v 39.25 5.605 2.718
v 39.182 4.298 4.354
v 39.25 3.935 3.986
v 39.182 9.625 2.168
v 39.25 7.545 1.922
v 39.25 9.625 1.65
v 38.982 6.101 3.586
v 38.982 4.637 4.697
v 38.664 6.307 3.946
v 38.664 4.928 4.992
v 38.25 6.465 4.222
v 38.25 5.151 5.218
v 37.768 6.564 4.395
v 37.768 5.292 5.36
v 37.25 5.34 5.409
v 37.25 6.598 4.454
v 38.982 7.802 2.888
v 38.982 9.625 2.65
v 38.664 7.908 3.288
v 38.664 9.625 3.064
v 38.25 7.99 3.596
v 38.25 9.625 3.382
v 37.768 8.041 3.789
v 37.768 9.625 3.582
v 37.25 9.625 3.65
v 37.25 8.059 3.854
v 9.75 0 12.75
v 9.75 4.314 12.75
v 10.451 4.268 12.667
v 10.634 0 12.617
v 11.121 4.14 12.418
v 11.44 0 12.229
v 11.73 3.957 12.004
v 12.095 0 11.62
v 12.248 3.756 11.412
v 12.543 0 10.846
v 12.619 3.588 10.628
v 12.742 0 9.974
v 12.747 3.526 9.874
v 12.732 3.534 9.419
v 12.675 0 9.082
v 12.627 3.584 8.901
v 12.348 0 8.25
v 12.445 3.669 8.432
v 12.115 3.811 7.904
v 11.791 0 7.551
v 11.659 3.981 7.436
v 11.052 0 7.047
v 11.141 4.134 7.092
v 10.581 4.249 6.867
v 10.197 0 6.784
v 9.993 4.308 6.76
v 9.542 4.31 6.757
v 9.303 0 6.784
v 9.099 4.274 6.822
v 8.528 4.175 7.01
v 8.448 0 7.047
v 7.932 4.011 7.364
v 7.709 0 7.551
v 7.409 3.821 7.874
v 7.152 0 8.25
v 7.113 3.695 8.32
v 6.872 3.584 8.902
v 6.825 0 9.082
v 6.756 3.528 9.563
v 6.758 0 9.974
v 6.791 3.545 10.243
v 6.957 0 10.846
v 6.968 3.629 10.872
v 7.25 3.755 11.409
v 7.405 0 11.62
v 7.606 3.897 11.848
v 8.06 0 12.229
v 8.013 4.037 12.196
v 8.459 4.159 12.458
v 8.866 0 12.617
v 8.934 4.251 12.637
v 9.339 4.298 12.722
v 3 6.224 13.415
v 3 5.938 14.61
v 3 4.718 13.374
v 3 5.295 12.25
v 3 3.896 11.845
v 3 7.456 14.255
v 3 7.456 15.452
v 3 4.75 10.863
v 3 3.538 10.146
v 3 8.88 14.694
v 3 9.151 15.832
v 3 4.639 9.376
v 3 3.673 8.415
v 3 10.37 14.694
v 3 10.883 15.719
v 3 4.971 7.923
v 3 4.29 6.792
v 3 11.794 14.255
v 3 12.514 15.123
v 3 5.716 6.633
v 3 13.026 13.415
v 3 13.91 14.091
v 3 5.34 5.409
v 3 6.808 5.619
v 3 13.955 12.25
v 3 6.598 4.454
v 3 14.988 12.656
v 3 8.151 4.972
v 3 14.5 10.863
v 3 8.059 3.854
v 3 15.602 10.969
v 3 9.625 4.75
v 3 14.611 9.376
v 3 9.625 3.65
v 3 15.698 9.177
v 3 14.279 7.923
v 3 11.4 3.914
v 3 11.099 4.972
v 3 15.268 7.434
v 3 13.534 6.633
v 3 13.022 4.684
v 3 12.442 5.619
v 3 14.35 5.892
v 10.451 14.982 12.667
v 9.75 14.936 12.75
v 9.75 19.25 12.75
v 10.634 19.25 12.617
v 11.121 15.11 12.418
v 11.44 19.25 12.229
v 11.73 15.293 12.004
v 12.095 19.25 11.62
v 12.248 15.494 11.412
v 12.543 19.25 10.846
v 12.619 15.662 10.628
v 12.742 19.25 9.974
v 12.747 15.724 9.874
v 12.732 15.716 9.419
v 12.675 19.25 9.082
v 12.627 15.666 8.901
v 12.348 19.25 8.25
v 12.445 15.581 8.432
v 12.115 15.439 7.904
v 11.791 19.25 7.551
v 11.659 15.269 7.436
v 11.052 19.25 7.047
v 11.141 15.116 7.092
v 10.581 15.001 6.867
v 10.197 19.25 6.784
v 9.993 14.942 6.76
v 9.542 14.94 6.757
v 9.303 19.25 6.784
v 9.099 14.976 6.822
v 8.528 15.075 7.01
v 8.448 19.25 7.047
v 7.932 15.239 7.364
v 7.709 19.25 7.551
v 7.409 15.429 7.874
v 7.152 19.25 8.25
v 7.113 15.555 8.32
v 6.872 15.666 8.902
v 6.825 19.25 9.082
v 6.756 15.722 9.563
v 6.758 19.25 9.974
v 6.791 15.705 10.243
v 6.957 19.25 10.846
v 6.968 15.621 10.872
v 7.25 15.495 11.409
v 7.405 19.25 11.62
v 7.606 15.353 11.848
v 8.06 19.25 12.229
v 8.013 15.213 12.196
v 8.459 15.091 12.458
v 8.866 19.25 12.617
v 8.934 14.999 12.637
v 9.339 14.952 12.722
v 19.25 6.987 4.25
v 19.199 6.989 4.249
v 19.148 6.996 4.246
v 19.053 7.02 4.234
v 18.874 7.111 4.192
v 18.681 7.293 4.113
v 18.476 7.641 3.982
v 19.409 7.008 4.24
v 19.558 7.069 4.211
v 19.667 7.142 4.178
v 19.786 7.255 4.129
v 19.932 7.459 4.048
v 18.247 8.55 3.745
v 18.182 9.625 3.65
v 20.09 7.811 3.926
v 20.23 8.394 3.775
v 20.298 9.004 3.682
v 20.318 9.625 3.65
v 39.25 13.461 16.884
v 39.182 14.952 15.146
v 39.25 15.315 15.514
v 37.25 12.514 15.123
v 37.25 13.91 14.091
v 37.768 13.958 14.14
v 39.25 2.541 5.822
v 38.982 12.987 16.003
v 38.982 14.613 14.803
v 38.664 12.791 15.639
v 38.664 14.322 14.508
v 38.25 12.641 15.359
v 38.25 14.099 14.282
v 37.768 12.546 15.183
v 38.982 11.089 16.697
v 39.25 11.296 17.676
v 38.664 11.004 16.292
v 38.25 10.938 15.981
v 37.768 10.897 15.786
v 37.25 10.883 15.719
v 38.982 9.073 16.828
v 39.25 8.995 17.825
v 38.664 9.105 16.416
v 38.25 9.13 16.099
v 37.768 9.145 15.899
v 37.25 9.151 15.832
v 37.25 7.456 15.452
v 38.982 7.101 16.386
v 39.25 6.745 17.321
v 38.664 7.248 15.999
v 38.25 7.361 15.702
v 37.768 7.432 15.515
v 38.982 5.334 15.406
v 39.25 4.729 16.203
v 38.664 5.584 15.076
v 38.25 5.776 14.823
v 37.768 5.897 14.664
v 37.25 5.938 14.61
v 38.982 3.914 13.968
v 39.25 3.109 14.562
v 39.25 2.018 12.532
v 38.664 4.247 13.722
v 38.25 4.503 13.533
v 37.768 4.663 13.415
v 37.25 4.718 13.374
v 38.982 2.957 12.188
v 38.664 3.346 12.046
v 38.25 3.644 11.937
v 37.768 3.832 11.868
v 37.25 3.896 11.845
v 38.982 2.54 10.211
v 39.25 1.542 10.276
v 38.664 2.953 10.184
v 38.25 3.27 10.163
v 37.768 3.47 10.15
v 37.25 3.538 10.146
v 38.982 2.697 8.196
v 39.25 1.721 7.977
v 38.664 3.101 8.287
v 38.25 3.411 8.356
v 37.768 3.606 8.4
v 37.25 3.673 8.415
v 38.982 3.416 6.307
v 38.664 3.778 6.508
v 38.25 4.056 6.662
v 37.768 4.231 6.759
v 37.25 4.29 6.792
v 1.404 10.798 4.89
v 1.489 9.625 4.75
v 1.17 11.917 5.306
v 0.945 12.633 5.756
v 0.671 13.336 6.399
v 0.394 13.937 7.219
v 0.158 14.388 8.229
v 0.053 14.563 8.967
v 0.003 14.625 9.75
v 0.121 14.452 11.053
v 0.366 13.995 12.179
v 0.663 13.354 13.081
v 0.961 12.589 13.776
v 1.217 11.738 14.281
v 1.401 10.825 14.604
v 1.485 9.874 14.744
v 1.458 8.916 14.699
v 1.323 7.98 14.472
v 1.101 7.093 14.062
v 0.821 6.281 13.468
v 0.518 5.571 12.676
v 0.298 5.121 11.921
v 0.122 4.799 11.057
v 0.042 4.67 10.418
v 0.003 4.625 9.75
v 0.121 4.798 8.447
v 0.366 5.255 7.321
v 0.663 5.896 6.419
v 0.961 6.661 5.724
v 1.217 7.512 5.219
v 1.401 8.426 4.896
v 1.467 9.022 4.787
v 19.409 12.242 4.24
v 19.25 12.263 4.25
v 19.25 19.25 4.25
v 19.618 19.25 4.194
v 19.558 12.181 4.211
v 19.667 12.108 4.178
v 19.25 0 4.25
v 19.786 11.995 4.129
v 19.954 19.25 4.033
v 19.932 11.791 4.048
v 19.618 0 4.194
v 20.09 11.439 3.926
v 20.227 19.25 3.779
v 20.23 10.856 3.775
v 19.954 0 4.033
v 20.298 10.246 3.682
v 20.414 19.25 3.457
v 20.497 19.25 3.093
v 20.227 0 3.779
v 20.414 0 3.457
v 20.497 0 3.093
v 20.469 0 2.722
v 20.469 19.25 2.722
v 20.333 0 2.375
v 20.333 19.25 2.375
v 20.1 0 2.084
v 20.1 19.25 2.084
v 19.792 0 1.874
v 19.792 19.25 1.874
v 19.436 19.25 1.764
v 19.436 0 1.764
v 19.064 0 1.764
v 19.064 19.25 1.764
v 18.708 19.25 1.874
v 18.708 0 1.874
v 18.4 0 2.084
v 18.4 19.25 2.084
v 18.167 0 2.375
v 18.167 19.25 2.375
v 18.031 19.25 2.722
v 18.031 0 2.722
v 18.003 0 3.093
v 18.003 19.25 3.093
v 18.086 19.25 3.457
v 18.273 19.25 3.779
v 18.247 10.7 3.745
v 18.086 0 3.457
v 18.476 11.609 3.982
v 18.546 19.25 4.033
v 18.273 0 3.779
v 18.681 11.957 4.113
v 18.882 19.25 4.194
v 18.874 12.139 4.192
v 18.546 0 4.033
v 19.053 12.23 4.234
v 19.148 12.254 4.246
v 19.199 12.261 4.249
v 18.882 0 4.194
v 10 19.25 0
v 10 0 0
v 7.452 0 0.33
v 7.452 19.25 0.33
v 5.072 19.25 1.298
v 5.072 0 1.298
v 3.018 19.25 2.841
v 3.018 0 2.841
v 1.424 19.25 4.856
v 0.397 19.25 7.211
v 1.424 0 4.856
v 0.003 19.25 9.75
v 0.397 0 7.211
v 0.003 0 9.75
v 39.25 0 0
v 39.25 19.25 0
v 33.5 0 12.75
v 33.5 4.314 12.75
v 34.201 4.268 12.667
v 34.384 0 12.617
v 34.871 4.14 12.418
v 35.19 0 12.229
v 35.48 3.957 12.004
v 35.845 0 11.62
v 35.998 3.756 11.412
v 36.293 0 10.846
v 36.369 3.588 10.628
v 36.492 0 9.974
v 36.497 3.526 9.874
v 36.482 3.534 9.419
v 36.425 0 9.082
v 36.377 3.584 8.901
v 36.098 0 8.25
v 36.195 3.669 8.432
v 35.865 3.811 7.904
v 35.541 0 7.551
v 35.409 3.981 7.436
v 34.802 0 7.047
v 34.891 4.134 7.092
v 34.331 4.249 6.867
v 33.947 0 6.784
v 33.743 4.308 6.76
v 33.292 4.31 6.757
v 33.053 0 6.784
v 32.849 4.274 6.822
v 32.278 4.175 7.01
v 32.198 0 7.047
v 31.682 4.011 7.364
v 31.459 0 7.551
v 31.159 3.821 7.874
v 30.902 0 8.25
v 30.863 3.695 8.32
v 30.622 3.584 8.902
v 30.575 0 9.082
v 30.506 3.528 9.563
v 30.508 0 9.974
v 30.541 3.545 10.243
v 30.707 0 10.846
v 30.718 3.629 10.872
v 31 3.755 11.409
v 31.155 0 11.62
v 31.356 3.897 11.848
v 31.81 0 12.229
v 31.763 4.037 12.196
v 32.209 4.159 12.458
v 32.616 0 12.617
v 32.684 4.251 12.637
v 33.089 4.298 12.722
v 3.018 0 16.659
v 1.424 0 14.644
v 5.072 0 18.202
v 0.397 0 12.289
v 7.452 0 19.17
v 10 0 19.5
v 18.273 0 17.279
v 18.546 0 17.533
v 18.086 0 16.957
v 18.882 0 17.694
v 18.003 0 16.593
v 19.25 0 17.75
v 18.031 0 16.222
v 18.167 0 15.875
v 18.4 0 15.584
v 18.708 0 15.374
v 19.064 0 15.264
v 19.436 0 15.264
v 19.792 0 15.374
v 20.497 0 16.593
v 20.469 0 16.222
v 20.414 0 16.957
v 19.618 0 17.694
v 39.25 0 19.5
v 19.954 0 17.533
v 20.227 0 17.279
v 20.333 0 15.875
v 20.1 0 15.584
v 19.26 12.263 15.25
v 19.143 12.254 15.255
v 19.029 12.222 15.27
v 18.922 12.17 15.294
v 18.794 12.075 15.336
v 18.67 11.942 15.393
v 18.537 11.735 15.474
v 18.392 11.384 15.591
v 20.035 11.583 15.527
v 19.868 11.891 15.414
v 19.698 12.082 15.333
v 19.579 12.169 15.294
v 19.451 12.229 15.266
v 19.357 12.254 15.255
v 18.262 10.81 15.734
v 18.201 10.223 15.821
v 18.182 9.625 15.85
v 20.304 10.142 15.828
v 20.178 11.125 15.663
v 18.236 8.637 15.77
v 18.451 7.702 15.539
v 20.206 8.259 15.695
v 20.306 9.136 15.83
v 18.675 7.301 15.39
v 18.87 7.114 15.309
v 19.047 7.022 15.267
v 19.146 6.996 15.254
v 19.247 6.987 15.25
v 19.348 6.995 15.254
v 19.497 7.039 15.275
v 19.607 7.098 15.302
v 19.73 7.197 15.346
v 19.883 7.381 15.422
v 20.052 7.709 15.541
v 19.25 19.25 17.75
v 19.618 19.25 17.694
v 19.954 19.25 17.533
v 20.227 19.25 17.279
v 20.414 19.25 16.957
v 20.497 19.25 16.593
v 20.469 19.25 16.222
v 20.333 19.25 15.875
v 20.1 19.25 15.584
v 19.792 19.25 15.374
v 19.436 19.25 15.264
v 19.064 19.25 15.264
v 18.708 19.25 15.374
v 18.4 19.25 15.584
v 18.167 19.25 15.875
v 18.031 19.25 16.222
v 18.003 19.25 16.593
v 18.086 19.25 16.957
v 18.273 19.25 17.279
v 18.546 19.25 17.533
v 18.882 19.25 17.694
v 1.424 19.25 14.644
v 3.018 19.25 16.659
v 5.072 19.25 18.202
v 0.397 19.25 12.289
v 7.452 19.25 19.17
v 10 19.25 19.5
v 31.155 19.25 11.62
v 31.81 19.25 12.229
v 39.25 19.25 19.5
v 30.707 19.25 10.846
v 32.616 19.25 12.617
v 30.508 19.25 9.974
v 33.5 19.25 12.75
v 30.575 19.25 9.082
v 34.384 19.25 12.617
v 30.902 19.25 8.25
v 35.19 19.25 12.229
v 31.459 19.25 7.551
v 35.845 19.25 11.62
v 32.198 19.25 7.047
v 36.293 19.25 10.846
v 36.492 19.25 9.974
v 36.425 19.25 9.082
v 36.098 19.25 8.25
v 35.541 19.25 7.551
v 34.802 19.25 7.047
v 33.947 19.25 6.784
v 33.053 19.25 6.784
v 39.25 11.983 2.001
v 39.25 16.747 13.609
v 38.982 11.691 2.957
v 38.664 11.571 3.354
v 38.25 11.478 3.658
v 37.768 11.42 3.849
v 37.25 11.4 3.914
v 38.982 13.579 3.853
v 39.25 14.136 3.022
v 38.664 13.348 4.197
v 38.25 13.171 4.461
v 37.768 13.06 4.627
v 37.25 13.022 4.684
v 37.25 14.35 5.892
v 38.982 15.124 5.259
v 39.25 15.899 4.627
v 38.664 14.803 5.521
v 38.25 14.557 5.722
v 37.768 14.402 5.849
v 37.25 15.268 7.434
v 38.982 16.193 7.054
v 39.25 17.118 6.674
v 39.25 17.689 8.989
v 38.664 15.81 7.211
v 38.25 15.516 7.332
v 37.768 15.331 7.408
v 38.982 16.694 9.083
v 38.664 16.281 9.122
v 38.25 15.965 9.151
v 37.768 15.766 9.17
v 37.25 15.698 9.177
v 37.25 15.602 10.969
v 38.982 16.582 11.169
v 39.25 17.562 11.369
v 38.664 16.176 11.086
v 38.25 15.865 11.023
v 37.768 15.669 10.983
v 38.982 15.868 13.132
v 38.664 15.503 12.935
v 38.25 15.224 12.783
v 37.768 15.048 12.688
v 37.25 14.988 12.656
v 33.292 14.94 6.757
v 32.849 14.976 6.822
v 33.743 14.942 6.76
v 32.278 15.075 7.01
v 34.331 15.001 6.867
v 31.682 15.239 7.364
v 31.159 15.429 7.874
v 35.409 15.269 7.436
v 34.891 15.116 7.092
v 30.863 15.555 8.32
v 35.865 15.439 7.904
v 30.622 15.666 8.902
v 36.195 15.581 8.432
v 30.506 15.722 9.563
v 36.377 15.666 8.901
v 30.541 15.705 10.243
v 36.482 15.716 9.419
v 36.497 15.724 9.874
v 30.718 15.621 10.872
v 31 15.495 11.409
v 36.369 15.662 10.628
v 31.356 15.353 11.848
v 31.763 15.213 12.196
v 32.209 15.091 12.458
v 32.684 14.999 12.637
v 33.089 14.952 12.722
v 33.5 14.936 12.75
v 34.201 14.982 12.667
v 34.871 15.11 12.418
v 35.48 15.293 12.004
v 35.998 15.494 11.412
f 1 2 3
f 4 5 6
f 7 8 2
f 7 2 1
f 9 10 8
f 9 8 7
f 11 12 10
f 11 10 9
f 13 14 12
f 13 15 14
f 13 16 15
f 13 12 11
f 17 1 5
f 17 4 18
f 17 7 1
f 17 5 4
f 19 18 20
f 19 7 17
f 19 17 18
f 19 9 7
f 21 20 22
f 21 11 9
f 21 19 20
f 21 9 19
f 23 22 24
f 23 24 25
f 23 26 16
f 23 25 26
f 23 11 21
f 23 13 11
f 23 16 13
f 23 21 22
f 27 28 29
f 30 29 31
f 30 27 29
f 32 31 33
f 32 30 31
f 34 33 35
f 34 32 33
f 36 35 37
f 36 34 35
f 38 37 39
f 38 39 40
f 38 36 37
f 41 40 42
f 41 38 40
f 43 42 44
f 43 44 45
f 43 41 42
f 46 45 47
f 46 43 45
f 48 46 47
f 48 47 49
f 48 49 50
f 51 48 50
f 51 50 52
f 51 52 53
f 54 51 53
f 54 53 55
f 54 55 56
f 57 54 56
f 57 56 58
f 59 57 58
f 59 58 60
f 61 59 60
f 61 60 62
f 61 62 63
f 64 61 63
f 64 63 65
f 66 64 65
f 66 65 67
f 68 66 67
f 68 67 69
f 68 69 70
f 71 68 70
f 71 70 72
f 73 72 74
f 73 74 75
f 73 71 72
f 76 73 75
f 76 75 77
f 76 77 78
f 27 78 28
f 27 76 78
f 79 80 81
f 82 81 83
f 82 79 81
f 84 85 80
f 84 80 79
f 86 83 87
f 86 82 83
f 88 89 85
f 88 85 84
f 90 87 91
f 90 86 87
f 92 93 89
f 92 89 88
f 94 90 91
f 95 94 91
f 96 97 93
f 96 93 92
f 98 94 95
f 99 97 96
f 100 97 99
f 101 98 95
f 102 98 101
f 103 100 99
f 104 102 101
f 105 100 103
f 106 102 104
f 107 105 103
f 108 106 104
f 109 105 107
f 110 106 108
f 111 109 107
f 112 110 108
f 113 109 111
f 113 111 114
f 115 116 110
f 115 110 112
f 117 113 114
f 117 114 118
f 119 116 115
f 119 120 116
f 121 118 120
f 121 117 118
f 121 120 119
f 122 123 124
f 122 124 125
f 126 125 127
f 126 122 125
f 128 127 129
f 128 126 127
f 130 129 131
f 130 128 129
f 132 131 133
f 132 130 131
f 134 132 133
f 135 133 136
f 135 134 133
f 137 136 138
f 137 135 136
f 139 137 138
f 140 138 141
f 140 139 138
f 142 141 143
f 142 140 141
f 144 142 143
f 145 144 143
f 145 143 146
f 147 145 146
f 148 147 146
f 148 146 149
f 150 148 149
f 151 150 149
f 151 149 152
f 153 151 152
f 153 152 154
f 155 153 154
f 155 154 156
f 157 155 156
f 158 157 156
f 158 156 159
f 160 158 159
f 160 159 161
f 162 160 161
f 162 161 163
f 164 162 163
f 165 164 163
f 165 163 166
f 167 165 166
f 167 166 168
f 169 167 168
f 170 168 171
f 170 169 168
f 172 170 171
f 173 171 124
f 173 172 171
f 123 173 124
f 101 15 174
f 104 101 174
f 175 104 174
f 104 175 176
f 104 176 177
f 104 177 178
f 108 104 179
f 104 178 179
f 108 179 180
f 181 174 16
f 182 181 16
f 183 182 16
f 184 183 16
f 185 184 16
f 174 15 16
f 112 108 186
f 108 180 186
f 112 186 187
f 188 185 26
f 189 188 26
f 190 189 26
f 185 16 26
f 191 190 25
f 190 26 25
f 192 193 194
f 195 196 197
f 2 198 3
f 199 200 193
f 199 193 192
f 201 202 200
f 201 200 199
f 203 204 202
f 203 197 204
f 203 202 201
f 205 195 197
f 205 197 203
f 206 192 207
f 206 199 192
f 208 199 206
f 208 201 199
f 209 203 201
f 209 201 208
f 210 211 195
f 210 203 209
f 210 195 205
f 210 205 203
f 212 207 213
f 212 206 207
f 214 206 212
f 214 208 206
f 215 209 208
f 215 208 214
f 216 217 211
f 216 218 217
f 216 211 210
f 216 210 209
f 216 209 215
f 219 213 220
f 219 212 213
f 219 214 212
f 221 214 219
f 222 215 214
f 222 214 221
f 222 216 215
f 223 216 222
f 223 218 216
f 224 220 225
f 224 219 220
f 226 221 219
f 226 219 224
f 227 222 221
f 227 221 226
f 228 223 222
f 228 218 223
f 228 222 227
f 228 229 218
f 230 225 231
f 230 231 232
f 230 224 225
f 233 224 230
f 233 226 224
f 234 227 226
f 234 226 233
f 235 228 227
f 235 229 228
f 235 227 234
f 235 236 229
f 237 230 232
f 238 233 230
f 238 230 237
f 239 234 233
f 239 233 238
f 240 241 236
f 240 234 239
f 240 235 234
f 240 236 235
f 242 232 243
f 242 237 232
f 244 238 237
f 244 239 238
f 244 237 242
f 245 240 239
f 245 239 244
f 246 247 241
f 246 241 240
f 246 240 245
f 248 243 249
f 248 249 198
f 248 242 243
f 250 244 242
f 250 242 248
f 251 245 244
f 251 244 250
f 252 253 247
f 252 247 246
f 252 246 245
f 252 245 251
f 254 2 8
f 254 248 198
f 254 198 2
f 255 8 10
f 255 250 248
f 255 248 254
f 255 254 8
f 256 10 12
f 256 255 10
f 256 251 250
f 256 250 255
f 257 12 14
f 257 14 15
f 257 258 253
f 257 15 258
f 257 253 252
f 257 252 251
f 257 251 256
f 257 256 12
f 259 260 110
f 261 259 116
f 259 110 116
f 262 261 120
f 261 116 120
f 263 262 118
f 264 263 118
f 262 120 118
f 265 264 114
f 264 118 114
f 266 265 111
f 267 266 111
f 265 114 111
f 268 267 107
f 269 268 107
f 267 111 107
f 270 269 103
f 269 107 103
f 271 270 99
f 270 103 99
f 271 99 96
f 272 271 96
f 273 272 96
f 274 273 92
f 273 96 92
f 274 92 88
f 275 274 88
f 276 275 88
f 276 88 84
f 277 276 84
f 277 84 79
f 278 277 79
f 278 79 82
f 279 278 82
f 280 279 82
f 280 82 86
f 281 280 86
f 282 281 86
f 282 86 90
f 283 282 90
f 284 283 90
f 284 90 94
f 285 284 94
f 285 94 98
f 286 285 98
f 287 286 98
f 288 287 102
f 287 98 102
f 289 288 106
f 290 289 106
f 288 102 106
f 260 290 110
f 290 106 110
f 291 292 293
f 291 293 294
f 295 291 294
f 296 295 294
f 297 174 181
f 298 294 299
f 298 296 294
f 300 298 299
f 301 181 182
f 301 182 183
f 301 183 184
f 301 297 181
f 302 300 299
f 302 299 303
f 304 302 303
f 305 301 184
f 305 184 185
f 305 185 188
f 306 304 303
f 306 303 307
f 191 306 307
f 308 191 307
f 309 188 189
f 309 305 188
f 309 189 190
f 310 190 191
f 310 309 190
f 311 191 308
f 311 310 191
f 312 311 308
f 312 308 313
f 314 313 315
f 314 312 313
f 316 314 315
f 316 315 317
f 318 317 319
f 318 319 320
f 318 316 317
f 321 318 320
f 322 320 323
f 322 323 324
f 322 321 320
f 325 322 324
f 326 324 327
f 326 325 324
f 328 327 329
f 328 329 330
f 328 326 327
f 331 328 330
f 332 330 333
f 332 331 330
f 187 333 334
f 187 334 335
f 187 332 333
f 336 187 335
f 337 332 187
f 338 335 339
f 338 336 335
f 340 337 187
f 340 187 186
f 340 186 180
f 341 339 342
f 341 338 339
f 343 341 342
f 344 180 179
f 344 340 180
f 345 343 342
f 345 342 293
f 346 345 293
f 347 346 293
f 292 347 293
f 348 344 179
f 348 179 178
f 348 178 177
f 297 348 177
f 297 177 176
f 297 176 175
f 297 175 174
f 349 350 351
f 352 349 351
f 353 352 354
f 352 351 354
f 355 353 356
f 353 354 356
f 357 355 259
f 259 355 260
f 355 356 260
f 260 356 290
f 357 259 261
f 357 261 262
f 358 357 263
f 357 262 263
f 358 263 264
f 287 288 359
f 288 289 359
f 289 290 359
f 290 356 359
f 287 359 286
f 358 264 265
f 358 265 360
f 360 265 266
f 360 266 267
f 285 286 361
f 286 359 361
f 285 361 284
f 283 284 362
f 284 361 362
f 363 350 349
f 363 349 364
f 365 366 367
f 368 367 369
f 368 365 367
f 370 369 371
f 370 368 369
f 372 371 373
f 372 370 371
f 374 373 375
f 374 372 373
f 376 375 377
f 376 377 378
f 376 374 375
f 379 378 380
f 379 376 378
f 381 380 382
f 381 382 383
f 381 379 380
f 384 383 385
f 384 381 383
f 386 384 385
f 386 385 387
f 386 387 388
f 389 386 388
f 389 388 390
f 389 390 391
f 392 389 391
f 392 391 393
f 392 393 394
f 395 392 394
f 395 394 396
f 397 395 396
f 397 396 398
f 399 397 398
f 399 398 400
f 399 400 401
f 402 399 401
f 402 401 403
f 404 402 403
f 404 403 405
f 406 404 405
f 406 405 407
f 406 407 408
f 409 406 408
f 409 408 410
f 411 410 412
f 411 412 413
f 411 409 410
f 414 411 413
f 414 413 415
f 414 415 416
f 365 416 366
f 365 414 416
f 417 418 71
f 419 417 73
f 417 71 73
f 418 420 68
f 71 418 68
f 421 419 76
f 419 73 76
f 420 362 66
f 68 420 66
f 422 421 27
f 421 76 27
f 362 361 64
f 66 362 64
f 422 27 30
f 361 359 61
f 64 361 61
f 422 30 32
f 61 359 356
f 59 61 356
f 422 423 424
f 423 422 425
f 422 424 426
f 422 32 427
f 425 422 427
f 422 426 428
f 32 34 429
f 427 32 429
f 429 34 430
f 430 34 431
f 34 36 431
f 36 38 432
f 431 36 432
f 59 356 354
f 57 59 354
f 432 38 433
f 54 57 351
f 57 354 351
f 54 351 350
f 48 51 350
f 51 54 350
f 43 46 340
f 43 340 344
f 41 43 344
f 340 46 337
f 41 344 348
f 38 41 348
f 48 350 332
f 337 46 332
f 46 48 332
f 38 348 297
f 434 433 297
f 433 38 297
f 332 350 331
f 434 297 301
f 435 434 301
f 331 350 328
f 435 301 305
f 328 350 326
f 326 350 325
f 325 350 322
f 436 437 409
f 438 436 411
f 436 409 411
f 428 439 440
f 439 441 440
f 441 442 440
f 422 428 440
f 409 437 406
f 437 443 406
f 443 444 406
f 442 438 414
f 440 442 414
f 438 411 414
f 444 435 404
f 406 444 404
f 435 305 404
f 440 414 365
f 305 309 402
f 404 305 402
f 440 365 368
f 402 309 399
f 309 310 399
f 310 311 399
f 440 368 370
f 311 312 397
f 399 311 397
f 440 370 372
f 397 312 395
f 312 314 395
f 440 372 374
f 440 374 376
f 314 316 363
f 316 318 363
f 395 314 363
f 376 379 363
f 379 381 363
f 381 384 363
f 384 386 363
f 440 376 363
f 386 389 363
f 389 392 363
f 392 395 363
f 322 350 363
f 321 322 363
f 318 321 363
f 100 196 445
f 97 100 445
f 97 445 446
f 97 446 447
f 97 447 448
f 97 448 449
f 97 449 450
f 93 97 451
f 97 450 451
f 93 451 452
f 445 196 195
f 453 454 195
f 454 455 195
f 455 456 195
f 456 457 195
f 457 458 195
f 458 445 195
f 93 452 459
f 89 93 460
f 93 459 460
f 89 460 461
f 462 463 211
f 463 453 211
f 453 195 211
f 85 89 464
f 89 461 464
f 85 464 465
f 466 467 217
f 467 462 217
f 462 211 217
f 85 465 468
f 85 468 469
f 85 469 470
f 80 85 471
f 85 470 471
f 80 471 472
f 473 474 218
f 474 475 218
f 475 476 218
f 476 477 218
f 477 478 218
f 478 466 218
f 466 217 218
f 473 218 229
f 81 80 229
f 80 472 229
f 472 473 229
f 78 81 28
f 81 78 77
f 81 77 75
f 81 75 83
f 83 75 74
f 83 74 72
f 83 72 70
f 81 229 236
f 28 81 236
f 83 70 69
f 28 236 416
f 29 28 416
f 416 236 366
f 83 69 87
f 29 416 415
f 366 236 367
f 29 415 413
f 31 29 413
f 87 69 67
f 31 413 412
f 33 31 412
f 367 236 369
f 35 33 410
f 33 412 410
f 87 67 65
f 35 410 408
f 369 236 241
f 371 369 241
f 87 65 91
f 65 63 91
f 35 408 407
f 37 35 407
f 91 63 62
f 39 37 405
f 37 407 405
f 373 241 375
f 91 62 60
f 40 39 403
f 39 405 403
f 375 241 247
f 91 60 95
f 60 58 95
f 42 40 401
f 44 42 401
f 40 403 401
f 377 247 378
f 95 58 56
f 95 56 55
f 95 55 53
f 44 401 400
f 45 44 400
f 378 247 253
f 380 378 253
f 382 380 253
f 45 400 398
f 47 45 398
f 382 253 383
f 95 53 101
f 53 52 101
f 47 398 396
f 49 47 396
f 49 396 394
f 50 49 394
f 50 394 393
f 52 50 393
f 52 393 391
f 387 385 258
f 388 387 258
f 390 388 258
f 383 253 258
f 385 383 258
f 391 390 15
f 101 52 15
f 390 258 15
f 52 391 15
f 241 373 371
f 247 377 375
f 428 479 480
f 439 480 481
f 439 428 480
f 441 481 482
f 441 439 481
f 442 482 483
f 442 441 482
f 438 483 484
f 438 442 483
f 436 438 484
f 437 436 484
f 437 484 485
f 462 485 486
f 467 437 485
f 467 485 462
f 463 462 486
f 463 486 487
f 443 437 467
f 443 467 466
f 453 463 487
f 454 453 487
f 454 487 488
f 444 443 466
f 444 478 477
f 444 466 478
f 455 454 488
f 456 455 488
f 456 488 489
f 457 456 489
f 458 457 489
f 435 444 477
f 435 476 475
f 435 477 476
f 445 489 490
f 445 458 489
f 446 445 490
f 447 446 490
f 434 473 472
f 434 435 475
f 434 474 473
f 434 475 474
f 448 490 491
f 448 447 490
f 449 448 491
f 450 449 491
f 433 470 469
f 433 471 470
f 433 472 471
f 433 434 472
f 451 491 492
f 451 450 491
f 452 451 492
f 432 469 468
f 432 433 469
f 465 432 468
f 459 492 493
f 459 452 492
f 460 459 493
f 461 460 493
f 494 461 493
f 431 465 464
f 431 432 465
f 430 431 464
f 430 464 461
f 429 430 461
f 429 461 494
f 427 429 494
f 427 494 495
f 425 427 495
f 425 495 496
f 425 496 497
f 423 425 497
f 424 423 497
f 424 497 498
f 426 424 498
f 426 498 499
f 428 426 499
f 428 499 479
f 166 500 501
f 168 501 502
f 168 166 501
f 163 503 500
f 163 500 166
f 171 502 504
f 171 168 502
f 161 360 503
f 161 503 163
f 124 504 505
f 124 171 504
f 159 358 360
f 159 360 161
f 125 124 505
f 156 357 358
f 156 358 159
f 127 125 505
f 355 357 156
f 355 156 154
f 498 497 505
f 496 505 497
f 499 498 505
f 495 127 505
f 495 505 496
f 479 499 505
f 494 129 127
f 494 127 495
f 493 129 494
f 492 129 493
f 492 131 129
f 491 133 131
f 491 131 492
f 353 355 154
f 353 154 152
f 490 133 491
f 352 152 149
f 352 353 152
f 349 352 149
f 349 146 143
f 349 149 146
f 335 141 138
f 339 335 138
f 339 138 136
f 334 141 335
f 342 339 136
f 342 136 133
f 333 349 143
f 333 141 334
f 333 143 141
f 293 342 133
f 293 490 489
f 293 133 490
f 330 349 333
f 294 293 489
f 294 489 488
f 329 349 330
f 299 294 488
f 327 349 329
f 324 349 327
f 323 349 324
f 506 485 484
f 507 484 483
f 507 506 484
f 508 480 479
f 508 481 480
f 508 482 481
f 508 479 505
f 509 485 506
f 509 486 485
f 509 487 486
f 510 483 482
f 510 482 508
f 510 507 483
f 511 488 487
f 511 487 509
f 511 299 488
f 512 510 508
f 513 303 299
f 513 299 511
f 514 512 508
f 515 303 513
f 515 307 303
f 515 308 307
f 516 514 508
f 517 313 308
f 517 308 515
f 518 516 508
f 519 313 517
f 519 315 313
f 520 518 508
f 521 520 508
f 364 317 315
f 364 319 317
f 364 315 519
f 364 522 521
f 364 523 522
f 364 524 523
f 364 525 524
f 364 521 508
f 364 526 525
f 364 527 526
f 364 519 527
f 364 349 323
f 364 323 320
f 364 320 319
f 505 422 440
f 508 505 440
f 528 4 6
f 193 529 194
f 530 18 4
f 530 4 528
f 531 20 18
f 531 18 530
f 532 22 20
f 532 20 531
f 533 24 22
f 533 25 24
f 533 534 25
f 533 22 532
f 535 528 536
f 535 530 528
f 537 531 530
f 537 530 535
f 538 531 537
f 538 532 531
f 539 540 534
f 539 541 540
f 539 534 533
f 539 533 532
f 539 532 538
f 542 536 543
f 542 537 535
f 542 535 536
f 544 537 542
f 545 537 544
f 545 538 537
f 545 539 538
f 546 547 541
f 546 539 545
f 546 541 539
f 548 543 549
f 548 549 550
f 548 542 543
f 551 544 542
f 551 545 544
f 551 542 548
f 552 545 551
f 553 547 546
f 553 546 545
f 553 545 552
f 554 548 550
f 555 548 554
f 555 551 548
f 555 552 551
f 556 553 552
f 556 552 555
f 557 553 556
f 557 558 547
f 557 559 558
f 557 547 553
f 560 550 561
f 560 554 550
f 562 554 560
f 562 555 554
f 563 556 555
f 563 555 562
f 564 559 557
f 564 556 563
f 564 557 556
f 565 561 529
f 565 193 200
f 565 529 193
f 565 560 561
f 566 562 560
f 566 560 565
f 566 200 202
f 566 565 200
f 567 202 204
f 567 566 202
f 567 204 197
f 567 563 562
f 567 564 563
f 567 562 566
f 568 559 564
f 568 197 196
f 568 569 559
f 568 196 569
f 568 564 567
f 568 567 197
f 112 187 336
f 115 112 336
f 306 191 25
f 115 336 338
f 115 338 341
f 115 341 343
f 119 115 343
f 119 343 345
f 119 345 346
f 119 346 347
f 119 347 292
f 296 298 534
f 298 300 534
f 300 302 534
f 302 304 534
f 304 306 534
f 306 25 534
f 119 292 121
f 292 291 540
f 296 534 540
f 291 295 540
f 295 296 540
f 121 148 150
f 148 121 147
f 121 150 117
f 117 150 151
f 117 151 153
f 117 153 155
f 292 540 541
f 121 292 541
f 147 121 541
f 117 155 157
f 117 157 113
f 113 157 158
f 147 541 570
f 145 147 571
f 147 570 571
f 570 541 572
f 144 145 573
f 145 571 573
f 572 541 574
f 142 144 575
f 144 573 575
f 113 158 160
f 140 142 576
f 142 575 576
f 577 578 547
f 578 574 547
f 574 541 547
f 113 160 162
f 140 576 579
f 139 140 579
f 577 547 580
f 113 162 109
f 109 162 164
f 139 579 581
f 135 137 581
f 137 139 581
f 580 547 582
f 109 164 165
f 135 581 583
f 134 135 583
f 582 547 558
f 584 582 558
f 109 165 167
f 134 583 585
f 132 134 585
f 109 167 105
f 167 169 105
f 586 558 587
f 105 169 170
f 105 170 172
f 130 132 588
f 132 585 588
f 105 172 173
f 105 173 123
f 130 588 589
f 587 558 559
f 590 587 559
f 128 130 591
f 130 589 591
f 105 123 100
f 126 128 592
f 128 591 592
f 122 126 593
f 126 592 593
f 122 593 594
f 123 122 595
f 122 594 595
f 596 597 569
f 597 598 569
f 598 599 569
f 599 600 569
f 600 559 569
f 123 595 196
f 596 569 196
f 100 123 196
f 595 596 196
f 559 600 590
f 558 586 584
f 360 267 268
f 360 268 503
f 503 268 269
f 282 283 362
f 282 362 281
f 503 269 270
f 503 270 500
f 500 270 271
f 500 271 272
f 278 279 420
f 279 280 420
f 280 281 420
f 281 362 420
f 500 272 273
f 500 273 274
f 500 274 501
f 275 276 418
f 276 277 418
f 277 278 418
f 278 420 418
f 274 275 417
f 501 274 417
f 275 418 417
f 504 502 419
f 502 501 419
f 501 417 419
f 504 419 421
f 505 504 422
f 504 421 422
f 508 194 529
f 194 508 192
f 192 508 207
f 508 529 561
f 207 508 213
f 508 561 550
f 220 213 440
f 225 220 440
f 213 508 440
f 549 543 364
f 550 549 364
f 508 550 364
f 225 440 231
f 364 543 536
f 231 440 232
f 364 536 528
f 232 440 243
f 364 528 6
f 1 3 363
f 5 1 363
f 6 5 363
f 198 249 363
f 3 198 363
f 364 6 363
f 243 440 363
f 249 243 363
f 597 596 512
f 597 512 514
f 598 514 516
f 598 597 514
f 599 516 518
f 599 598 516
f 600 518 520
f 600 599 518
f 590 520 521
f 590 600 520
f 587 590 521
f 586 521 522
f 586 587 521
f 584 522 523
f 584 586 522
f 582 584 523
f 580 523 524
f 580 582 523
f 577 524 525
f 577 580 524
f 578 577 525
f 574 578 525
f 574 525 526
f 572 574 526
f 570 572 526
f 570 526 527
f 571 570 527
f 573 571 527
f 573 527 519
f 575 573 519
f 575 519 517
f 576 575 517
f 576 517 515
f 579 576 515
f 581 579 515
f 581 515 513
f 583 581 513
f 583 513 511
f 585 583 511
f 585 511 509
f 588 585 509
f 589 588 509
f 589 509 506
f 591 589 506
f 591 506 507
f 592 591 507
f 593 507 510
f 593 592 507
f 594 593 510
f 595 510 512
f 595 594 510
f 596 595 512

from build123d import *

# Parameters (mm, degrees)
SKETCH1_W           = 39.25
SKETCH1_H           = 19.5
SKETCH1_R           = 1.25
SKETCH1_R_2         = 3
BOSS_EXTRUDE1_DEPTH = 19.25
CUT_EXTRUDE1_DEPTH  = 36.25
FILLET1_R           = 2
FILLET3_R           = 10
CUT_EXTRUDE3_REACH  = 47.441
SKETCH4_R           = 5


with BuildPart() as part:
    # Sketch1 → Boss-Extrude1 (new body)
    with BuildSketch(Plane(origin=(0, 0, 0), x_dir=(1, 0, 0), z_dir=(0, 1, 0))):
        with Locations((19.625, -9.75)):
            Rectangle(SKETCH1_W, SKETCH1_H)
        with Locations(Location((19.25, -16.5, 0), (0, 0, 270))):
            Circle(SKETCH1_R, mode=Mode.SUBTRACT)
        with Locations(Location((19.25, -3, 0), (0, 0, 270))):
            Circle(SKETCH1_R, mode=Mode.SUBTRACT)
        with Locations(Location((9.75, -9.75, 0), (0, 0, 270))):
            Circle(SKETCH1_R_2, mode=Mode.SUBTRACT)
        with Locations(Location((33.5, -9.75, 0), (0, 0, 270))):
            Circle(SKETCH1_R_2, mode=Mode.SUBTRACT)
    extrude(amount=BOSS_EXTRUDE1_DEPTH)

    # Sketch2 → Cut-Extrude1 (cut)
    with BuildSketch(Plane(origin=(39.25, 0, 0), x_dir=(0, 0, -1), z_dir=(1, 0, 0))):
        with BuildLine():
            ThreePointArc((-3.65, 9.625), (-7.433822489, 15.268165932), (-14.091089094, 13.910434106))
            Line((-14.091089094, 13.910434106), (-5.408910906, 5.339565894))
            ThreePointArc((-5.408910906, 5.339565894), (-4.106834068, 7.308822489), (-3.65, 9.625))
        make_face()
        with BuildLine():
            Line((-5.408910906, 5.339565894), (-14.091089094, 13.910434106))
            ThreePointArc((-14.091089094, 13.910434106), (-14.035434106, 5.283910906), (-5.408910906, 5.339565894))
        make_face()
    extrude(amount=-CUT_EXTRUDE1_DEPTH, mode=Mode.SUBTRACT)

    # Fillet1
    fillet1_edges = [part.edges().sort_by_distance(p)[0] for p in [
        (39.25, 5.339565894, 5.408910906),
    ]]
    fillet(fillet1_edges, radius=FILLET1_R)

    # Fillet3
    # the kernel refuses this fillet: 10 mm, written as the material it takes off along each edge
    with BuildSketch(Plane(origin=(0, -25, 19.5), x_dir=(1, 0, 0), z_dir=(0, 1, 0))) as fillet3_piece_1:
        with BuildLine():
            CenterArc((FILLET3_R, FILLET3_R), FILLET3_R, 180, 90)
            Line((0, FILLET3_R), (0, 0))
            Line((0, 0), (FILLET3_R, 0))
        make_face()
    extrude(amount=69.25, mode=Mode.SUBTRACT)
    with BuildSketch(Plane(origin=(0, -25, 0), x_dir=(1, 0, 0), z_dir=(0, 1, 0))) as fillet3_piece_2:
        with BuildLine():
            CenterArc((FILLET3_R, -FILLET3_R), FILLET3_R, 90, 90)
            Line((0, -FILLET3_R), (0, 0))
            Line((0, 0), (FILLET3_R, 0))
        make_face()
    extrude(amount=69.25, mode=Mode.SUBTRACT)

    # Sketch4 → Cut-Extrude3 (cut, up to next)
    with BuildSketch(Plane(origin=(3, 0, 0), x_dir=(0, 0, -1), z_dir=(1, 0, 0)), mode=Mode.PRIVATE) as cut_extrude3_sk1:
        with Locations((-9.75, 9.625)):
            Circle(SKETCH4_R)
    cut_extrude3_tool1 = extrude(cut_extrude3_sk1.sketch, amount=-CUT_EXTRUDE3_REACH, mode=Mode.PRIVATE) & part.part
    add(cut_extrude3_tool1.solids().sort_by_distance((3, 9.625, 9.75))[0], mode=Mode.SUBTRACT)


solid = part.part
